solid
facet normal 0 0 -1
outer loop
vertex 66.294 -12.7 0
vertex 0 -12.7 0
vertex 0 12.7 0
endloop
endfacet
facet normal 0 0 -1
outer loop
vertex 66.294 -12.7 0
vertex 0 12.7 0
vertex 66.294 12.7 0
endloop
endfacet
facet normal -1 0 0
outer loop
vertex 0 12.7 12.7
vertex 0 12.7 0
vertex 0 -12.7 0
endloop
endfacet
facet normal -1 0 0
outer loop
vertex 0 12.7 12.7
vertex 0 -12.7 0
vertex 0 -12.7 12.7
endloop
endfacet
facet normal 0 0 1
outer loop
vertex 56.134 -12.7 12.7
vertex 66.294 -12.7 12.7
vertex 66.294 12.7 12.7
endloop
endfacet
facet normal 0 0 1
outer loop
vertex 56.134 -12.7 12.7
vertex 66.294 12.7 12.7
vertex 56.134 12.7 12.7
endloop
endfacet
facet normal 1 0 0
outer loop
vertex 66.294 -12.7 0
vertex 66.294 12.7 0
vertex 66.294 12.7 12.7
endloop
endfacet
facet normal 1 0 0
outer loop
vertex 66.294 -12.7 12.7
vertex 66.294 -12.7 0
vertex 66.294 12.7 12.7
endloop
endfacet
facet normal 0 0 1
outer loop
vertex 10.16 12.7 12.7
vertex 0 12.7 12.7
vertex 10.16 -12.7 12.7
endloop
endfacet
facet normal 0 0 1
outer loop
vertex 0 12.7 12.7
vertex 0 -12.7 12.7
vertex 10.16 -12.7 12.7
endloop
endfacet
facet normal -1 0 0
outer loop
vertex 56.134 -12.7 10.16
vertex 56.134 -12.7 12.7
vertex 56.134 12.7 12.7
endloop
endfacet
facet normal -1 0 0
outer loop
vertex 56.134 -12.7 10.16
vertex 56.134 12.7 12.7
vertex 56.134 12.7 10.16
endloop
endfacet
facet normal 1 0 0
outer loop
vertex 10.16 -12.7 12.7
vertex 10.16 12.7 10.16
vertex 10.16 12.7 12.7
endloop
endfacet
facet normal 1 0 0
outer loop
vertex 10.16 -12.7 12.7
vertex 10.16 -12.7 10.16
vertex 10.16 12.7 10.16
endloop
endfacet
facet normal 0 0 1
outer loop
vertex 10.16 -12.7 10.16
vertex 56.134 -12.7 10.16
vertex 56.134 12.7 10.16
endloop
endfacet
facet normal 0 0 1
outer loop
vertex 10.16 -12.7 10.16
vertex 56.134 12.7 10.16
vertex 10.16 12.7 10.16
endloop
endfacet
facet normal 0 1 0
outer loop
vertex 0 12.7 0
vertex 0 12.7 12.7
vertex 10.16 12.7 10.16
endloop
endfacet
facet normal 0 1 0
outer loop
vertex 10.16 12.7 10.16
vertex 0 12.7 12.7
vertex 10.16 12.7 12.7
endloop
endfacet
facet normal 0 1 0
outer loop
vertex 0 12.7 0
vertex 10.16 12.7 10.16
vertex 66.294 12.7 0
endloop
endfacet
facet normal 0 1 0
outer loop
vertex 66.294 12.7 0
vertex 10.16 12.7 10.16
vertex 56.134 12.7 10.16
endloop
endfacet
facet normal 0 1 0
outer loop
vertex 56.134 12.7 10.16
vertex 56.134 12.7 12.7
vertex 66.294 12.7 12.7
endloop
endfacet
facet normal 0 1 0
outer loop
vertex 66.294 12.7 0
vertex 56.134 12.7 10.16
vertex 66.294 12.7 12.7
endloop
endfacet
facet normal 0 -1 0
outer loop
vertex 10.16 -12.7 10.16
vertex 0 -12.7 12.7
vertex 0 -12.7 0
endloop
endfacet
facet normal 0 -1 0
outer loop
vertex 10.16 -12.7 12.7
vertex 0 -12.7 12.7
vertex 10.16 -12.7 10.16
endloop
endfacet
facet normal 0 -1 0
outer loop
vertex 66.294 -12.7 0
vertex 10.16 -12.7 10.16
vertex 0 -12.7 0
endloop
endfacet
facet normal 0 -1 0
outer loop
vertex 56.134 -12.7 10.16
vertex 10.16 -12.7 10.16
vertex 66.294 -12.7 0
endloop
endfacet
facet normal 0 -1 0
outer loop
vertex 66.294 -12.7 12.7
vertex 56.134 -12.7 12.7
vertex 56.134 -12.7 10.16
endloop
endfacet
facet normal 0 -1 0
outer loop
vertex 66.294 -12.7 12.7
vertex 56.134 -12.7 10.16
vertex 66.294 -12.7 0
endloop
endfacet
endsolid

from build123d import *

# Parameters (mm, degrees)
F1_DEPTH = 12.7
F0_W     = 5.842
F0_H     = 12.7
F2_DEPTH = 12.7


with BuildPart() as f1:
    # F0 (on Front) → F1 (new body, symmetric)
    with BuildSketch(Plane.XZ):
        Polygon((5.842, 12.7), (5.842, 0), (66.294, 0), (66.294, 12.7), (56.134, 12.7), (56.134, 10.16), (10.16, 10.16), (10.16, 12.7), align=None)
    extrude(amount=F1_DEPTH, both=True)

    # F0 (on Front) → F2 (join, symmetric)
    with BuildSketch(Plane.XZ):
        with Locations((2.921, 6.35)):
            Rectangle(F0_W, F0_H)
    extrude(amount=F2_DEPTH, both=True)


solid = f1.part
